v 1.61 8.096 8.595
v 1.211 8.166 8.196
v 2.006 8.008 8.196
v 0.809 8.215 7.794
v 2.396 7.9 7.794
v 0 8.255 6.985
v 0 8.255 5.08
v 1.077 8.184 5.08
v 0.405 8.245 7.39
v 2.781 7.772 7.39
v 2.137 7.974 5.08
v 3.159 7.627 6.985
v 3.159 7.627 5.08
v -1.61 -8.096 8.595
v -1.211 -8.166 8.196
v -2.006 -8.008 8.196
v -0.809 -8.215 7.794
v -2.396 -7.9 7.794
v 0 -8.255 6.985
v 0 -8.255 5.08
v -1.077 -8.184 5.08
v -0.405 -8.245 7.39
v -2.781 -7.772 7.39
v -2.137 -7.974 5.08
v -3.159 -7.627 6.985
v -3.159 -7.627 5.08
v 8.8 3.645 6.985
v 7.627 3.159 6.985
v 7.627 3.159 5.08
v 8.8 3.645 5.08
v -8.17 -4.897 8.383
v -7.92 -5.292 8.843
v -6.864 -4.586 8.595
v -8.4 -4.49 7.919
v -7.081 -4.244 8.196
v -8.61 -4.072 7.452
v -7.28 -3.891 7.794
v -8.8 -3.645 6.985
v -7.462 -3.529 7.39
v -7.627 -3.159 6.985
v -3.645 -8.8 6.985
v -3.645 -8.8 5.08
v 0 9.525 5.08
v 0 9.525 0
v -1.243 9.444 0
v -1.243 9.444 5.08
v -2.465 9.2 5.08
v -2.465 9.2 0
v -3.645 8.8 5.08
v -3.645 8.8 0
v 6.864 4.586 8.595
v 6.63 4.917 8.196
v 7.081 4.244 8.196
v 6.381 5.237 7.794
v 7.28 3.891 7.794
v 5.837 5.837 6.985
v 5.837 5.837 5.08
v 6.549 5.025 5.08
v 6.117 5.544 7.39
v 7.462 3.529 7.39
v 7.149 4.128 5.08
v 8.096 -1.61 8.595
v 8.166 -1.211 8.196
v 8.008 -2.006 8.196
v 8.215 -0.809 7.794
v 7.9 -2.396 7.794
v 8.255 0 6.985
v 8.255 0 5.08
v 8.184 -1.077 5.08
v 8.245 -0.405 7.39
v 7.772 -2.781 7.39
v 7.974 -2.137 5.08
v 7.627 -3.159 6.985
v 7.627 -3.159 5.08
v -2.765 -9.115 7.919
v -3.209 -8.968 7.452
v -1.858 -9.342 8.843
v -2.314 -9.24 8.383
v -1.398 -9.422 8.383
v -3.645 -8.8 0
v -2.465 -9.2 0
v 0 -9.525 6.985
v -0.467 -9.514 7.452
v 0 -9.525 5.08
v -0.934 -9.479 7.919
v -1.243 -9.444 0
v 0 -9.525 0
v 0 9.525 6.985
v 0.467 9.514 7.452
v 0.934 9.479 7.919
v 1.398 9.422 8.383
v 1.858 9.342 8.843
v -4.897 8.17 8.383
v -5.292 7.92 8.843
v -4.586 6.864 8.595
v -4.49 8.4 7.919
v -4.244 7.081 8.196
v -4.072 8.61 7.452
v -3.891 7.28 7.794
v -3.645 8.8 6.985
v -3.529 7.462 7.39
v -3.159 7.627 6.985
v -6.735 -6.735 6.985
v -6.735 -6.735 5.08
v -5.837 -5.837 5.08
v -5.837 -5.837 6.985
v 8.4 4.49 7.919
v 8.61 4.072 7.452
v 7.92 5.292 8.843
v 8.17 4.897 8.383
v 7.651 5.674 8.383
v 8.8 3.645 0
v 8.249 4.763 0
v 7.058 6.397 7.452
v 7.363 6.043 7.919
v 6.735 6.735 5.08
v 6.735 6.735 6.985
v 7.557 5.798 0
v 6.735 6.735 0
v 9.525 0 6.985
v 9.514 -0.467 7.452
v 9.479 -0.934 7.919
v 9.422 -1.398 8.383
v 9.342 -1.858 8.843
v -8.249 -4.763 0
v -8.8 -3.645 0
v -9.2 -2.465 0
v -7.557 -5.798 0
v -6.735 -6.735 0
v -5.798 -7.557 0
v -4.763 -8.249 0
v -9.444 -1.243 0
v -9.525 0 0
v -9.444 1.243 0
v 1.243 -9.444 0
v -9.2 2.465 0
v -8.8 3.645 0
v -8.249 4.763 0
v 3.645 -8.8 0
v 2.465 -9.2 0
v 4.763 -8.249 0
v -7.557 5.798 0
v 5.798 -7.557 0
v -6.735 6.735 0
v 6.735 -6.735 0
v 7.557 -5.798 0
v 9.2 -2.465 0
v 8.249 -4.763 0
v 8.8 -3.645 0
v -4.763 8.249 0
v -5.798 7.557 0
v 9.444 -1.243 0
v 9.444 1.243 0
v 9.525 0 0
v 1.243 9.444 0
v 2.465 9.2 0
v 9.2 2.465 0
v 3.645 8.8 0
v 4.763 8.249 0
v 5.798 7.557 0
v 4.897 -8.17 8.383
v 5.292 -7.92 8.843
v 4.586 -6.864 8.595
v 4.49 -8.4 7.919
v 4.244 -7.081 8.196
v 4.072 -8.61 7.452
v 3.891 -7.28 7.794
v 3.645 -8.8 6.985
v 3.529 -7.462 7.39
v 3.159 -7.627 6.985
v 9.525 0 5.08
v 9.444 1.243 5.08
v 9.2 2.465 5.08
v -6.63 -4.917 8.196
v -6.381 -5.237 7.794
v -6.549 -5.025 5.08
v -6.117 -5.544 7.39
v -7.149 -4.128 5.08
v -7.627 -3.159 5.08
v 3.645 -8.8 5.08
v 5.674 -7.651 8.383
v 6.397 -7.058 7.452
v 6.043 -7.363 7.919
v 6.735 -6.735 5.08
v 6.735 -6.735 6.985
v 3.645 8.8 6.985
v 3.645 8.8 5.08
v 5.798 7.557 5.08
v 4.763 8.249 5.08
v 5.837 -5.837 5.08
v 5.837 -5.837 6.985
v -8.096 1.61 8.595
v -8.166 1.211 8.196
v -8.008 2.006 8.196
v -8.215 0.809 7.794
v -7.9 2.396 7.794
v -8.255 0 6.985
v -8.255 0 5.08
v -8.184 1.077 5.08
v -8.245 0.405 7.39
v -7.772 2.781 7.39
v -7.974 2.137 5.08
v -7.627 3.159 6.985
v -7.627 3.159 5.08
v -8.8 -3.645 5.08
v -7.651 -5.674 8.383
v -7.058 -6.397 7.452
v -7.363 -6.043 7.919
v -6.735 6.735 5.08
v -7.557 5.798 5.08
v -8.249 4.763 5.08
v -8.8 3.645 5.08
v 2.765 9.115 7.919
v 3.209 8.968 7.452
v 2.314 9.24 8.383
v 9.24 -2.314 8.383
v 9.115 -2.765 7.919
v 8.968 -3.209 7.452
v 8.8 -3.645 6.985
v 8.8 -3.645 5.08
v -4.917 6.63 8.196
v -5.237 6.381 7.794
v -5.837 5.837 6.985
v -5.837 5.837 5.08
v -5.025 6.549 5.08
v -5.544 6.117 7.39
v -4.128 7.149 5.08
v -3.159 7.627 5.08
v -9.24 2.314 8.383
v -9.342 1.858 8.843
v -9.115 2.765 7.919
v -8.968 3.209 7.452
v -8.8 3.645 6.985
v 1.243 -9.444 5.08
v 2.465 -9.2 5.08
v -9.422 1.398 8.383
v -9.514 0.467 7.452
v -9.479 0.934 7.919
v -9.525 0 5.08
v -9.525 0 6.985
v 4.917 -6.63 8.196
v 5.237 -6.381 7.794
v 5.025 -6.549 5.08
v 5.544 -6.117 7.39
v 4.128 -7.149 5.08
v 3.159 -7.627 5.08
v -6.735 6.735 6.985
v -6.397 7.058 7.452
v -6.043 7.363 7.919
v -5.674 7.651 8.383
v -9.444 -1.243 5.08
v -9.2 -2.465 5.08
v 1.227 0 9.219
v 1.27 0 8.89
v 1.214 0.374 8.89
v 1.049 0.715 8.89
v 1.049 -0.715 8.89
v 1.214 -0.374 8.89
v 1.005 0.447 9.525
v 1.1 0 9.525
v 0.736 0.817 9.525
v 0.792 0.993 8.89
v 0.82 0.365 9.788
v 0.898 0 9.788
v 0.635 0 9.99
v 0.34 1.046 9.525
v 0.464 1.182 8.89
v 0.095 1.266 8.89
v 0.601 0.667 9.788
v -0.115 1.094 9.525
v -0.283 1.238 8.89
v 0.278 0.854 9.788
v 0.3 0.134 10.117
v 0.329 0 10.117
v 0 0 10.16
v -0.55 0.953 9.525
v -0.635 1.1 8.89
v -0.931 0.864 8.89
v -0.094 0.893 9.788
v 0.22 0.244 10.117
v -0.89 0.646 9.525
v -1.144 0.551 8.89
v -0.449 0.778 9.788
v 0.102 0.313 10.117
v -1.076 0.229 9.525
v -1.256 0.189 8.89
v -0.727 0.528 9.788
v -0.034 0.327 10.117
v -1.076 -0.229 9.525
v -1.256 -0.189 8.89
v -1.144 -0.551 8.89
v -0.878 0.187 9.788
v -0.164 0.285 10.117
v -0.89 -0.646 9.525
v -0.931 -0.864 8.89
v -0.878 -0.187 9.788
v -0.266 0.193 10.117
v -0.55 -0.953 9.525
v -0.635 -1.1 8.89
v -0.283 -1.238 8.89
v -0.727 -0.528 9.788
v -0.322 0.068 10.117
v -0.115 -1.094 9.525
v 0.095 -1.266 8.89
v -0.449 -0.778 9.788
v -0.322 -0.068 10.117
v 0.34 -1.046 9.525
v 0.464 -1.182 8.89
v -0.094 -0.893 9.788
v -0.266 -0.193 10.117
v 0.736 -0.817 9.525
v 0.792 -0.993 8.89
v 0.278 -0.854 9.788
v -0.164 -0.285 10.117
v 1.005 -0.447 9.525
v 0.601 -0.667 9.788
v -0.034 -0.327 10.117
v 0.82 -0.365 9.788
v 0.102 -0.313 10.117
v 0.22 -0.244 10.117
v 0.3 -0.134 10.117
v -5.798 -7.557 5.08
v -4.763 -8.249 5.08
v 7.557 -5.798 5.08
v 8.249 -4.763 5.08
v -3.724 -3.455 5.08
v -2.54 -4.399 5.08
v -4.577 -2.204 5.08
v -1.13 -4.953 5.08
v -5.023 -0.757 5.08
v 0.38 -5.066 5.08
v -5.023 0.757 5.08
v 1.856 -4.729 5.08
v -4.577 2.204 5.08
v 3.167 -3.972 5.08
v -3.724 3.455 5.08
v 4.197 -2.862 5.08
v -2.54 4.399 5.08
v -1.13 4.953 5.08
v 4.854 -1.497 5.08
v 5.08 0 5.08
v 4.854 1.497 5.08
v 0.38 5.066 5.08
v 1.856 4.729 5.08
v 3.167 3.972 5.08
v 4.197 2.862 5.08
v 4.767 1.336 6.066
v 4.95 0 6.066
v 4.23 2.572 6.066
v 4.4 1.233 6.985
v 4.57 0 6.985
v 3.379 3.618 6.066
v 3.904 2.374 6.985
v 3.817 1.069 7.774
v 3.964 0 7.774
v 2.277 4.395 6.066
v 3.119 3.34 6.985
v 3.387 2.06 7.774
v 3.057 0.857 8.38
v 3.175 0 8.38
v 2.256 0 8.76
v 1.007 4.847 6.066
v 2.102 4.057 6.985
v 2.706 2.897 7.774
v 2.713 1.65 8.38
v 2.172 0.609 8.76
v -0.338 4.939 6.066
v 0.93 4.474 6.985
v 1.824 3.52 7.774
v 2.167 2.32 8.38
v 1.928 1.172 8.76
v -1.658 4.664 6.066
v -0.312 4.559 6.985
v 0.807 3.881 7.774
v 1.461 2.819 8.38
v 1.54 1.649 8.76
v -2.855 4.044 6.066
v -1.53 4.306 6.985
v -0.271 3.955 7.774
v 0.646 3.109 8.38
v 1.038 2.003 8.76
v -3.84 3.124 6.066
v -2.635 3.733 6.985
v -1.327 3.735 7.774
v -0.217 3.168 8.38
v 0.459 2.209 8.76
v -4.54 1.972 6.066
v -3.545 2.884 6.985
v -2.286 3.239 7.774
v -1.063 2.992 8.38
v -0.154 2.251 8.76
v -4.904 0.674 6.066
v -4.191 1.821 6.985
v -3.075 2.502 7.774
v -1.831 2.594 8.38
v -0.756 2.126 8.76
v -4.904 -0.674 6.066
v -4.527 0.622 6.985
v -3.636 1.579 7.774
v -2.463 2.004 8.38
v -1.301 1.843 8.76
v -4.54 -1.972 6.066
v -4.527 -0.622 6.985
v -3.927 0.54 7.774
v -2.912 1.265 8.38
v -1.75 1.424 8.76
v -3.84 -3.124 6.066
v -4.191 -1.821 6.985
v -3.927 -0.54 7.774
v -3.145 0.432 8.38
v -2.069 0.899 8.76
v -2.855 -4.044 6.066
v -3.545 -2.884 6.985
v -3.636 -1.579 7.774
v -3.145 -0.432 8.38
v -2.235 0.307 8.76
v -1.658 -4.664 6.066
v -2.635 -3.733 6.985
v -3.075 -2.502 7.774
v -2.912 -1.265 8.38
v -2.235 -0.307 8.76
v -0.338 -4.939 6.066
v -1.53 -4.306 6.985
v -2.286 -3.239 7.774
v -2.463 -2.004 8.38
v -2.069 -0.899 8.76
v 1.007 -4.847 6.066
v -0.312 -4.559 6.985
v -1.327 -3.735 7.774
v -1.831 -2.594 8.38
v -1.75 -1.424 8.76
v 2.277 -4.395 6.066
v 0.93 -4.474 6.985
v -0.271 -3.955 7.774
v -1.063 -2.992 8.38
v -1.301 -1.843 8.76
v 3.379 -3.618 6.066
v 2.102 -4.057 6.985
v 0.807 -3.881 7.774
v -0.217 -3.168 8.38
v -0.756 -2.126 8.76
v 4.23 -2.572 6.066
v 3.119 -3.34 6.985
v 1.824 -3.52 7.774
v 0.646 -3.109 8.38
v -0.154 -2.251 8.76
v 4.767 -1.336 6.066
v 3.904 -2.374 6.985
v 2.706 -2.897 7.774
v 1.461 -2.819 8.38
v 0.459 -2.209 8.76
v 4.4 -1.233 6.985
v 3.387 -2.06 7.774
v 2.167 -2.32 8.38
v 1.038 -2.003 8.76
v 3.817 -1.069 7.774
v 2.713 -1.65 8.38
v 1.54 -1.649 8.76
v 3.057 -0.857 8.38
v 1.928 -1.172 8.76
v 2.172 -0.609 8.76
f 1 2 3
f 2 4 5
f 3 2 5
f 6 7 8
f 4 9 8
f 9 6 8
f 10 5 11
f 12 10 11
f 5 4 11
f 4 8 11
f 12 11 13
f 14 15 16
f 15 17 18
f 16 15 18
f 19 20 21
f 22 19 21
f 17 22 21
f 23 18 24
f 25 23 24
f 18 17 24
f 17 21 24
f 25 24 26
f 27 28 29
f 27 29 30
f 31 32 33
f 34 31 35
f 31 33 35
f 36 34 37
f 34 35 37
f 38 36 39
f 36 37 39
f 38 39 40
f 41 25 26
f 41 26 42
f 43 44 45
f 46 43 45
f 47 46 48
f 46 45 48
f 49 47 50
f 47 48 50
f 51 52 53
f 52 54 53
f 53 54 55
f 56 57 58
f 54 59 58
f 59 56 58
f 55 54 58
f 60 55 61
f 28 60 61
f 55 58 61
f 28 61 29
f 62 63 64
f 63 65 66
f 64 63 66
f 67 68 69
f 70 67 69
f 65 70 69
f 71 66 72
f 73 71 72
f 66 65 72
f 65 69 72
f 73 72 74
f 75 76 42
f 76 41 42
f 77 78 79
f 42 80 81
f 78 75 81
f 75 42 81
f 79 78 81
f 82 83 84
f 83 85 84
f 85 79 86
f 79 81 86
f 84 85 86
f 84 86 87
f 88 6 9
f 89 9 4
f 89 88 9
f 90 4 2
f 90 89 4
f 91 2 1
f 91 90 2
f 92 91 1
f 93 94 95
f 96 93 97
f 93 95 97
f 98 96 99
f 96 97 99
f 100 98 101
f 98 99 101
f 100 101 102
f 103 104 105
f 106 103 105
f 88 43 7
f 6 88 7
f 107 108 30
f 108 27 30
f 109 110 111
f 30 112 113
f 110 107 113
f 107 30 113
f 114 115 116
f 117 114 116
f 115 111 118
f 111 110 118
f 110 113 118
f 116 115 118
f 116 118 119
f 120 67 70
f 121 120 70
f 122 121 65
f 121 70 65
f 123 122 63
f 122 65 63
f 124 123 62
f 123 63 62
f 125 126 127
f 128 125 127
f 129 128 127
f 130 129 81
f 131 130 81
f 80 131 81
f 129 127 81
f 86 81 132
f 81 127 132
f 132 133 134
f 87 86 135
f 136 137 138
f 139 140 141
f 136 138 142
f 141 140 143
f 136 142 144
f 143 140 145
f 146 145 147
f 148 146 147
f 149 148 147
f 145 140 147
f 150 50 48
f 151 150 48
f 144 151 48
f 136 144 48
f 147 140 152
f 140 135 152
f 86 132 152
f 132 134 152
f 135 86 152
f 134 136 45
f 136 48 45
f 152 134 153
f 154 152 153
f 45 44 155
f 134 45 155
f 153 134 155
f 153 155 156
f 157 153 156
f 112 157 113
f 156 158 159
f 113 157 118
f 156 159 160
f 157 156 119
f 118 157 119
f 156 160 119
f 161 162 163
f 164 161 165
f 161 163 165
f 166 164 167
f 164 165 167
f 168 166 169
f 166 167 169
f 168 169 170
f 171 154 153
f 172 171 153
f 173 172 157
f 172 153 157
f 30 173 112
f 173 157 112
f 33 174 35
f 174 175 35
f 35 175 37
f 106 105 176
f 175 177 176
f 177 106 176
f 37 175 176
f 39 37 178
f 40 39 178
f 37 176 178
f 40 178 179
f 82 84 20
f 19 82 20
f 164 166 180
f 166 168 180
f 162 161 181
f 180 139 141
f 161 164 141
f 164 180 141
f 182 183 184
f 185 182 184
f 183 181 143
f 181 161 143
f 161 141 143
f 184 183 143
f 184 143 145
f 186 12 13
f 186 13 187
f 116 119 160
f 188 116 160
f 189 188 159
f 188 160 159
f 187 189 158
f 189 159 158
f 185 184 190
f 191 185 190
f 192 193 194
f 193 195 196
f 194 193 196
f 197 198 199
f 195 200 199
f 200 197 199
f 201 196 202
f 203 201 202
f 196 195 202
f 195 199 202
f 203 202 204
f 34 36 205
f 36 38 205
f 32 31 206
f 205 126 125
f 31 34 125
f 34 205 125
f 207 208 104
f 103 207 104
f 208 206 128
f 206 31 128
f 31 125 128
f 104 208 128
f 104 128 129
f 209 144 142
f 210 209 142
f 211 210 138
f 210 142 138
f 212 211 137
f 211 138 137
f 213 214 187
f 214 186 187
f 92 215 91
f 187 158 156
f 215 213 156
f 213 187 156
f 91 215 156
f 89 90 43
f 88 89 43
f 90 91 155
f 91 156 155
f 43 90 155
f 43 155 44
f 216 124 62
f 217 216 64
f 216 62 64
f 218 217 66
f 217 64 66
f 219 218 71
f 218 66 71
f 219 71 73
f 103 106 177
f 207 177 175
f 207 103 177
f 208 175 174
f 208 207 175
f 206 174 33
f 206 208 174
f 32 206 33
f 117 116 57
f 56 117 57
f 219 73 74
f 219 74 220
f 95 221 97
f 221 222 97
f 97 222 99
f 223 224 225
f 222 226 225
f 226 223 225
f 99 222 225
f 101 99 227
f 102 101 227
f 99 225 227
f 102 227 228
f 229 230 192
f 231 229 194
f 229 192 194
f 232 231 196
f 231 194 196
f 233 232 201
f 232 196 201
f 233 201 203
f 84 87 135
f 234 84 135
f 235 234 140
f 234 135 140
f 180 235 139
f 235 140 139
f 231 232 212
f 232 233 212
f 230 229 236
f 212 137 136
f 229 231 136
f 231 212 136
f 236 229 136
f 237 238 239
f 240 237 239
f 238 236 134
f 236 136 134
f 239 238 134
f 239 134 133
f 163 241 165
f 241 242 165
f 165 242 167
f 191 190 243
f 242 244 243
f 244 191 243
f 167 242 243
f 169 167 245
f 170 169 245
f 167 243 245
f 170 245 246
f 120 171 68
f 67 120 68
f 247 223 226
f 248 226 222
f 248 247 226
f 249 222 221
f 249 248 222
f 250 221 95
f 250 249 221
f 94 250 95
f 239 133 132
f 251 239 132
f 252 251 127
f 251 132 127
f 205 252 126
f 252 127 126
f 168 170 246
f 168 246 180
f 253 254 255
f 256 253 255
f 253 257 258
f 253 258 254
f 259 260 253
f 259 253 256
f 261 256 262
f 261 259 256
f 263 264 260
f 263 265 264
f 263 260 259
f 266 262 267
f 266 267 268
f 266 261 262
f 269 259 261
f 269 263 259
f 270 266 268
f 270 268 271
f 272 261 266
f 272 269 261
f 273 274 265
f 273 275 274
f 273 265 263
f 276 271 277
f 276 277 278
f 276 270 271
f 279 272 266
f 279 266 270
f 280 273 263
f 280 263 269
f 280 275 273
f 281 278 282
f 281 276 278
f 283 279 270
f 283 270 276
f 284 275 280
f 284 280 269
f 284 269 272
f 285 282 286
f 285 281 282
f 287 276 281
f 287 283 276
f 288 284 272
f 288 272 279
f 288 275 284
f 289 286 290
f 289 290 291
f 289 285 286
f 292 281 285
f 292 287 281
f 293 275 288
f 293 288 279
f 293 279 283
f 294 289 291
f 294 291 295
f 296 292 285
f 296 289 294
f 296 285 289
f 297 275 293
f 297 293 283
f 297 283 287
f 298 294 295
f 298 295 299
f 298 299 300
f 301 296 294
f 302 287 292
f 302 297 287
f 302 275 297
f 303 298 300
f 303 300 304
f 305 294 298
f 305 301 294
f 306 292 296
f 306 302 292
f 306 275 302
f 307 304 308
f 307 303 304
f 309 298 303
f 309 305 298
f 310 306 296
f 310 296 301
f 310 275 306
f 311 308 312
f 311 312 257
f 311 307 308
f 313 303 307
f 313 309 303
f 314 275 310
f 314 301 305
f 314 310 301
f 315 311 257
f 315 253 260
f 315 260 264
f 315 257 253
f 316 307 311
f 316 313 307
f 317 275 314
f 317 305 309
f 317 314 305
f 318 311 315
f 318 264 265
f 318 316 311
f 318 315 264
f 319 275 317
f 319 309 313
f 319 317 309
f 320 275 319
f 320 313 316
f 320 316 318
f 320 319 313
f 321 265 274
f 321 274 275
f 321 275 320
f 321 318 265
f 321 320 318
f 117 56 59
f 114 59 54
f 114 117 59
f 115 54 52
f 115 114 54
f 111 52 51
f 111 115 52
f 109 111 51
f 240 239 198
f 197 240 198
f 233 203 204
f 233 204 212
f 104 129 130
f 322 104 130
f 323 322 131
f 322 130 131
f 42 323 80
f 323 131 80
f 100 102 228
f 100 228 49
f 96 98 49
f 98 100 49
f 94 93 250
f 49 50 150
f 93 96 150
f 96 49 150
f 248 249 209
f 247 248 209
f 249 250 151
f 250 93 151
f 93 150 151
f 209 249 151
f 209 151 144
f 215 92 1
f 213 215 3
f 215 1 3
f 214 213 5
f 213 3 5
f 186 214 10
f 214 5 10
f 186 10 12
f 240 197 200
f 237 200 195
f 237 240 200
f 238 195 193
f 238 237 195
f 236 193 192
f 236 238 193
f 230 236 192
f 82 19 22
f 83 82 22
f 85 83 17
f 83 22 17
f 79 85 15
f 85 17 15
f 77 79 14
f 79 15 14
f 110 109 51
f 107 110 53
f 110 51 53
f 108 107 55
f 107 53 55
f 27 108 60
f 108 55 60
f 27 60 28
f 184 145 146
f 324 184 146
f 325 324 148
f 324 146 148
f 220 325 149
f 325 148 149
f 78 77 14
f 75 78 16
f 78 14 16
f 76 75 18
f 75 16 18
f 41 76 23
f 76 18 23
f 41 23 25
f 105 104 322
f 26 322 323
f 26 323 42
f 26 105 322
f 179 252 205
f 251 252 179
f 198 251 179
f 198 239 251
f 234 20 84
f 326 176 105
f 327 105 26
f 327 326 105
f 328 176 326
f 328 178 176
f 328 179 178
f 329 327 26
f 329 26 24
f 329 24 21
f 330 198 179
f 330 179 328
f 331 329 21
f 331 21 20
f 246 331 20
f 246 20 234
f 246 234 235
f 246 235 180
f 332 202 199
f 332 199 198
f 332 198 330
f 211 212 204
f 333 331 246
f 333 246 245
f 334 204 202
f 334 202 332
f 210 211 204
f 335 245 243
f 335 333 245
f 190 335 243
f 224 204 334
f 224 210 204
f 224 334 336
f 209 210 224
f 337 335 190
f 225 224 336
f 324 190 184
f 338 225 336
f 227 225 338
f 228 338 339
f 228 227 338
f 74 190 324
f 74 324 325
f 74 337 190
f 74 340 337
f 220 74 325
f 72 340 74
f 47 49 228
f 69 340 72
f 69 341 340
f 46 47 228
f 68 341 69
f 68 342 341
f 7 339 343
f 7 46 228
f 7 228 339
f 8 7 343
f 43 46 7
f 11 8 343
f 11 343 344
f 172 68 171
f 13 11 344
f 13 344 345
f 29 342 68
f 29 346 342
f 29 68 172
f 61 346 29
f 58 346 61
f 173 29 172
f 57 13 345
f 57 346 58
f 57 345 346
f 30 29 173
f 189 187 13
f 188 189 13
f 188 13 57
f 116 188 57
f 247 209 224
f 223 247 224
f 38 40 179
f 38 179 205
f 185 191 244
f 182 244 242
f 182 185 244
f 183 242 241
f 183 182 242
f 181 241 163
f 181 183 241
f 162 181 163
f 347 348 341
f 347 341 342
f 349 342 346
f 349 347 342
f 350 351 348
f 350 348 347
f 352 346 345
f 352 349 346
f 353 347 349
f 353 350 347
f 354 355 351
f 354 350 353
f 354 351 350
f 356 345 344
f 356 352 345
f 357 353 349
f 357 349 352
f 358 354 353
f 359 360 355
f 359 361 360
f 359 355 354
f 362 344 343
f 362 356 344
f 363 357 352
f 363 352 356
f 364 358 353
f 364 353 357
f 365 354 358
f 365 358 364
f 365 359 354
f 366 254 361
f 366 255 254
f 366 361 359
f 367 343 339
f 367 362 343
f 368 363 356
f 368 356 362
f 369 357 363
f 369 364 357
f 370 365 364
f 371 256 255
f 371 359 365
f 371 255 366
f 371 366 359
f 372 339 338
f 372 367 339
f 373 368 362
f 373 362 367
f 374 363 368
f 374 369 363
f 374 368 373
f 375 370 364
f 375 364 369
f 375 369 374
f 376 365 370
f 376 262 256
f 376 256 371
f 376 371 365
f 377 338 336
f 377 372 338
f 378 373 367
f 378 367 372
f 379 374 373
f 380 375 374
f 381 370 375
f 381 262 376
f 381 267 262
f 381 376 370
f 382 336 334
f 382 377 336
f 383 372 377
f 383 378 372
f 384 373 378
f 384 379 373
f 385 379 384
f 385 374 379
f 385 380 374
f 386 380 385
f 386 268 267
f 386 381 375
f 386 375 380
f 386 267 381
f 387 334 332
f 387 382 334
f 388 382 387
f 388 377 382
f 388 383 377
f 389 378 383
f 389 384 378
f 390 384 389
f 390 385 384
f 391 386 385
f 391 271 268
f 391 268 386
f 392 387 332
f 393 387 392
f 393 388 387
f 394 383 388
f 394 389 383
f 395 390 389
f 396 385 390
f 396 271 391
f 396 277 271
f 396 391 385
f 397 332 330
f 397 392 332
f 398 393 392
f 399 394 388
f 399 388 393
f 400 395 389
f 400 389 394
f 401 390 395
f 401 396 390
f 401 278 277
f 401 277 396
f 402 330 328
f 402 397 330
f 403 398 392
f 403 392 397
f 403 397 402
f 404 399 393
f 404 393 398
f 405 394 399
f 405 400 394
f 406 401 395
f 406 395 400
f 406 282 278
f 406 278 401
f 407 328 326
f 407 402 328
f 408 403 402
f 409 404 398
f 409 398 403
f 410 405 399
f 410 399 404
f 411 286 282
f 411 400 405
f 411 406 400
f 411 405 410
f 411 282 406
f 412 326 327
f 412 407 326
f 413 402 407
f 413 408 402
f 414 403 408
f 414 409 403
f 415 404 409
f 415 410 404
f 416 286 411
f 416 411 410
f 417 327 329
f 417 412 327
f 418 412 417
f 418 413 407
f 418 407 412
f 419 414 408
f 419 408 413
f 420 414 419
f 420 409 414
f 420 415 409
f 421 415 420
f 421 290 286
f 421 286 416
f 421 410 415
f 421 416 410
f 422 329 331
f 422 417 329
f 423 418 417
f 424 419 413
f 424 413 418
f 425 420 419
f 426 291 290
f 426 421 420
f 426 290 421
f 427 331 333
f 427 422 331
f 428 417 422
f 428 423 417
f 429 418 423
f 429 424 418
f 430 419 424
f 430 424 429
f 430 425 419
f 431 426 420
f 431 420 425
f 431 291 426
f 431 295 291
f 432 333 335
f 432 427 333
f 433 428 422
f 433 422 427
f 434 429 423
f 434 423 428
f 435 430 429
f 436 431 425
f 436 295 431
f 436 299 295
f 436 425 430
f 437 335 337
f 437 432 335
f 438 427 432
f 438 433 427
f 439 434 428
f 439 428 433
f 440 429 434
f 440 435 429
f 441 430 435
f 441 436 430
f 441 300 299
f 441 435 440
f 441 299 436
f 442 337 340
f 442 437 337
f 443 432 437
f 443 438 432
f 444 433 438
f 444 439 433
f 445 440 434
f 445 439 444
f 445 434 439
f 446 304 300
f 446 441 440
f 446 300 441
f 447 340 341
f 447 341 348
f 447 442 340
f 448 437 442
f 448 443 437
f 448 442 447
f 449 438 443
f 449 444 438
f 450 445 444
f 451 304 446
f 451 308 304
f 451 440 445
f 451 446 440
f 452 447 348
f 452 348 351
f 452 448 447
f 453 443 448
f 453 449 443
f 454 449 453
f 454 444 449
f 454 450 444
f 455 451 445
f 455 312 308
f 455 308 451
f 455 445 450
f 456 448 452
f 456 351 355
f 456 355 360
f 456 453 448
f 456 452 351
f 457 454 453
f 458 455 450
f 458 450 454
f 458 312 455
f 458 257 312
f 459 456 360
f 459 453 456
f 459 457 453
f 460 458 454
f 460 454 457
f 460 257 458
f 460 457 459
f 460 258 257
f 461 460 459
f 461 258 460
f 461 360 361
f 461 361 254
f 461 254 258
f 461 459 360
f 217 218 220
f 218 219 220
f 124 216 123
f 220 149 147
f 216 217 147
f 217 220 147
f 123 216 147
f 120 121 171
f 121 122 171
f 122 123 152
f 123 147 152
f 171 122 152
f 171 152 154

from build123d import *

# Parameters (mm, degrees)
F1_DEPTH     = 5.08
F2_DEPTH     = 8.89
F3_T1_DEPTH  = 11.0681121842
F3_T3_DEPTH  = 11.0681121842
F3_T5_DEPTH  = 11.0681121842
F3_T7_DEPTH  = 11.0681121842
F3_T9_DEPTH  = 11.0681121842
F3_T11_DEPTH = 11.0681121842
F3_T13_DEPTH = 11.0681121842
F3_T15_DEPTH = 11.0681121842
F3_T17_DEPTH = 11.0681121842
F3_T19_DEPTH = 11.0681121842
F3_T21_DEPTH = 11.0681121842
F3_T23_DEPTH = 11.0681121842
F3_T25_DEPTH = 11.0681121842
F3_T27_DEPTH = 11.0681121842
F3_T29_DEPTH = 11.0681121842
F3_T31_DEPTH = 11.0681121842
F4_R         = 5.08
F5_DEPTH     = 3.81
F6_R         = 3.80999
F7_R         = 1.27
F8_DEPTH     = 1.27
F9_R         = 1.26999


# Not quite as in the source:
# - a fillet or chamfer that OpenCascade refuses, or shapes differently, is made with other operations: its cross-section is extruded or revolved along the edge and cut away or added
# - a fillet or chamfer is up to 0.001 mm smaller than in the source, because OpenCascade refuses the exact size
# - a feature names something its author has since deleted; it is built from what else it names


with BuildPart() as f1:
    # F0 (on Top) → F1 (new body)
    with BuildSketch(Plane.XY):
        with BuildLine():
            Line((8.255, 0), (9.525, 0))
            ThreePointArc((9.525, 0), (9.3419797958, 1.8582353172), (8.7999525472, 3.6450596933))
            Line((8.7999525472, 3.6450596933), (7.6266255409, 3.1590517342))
            ThreePointArc((7.6266255409, 3.1590517342), (6.8637816496, 4.5862322736), (5.8371664787, 5.8371664787))
            Line((5.8371664787, 5.8371664787), (6.7351920908, 6.7351920908))
            ThreePointArc((6.7351920908, 6.7351920908), (5.2918064695, 7.9197480572), (3.6450596933, 8.7999525472))
            Line((3.6450596933, 8.7999525472), (3.1590517342, 7.6266255409))
            ThreePointArc((3.1590517342, 7.6266255409), (1.6104706082, 8.0963824897), (0, 8.255))
            Line((0, 8.255), (0, 9.525))
            ThreePointArc((0, 9.525), (-1.8582353172, 9.3419797958), (-3.6450596933, 8.7999525472))
            Line((-3.6450596933, 8.7999525472), (-3.1590517342, 7.6266255409))
            ThreePointArc((-3.1590517342, 7.6266255409), (-4.5862322736, 6.8637816496), (-5.8371664787, 5.8371664787))
            Line((-5.8371664787, 5.8371664787), (-6.7351920908, 6.7351920908))
            ThreePointArc((-6.7351920908, 6.7351920908), (-7.9197480572, 5.2918064695), (-8.7999525472, 3.6450596933))
            Line((-8.7999525472, 3.6450596933), (-7.6266255409, 3.1590517342))
            ThreePointArc((-7.6266255409, 3.1590517342), (-8.0963824897, 1.6104706082), (-8.255, 0))
            Line((-8.255, 0), (-9.525, 0))
            ThreePointArc((-9.525, 0), (-9.3419797958, -1.8582353172), (-8.7999525472, -3.6450596933))
            Line((-8.7999525472, -3.6450596933), (-7.6266255409, -3.1590517342))
            ThreePointArc((-7.6266255409, -3.1590517342), (-6.8637816496, -4.5862322736), (-5.8371664787, -5.8371664787))
            Line((-5.8371664787, -5.8371664787), (-6.7351920908, -6.7351920908))
            ThreePointArc((-6.7351920908, -6.7351920908), (-5.2918064695, -7.9197480572), (-3.6450596933, -8.7999525472))
            Line((-3.6450596933, -8.7999525472), (-3.1590517342, -7.6266255409))
            ThreePointArc((-3.1590517342, -7.6266255409), (-1.6104706082, -8.0963824897), (0, -8.255))
            Line((0, -8.255), (0, -9.525))
            ThreePointArc((0, -9.525), (1.8582353172, -9.3419797958), (3.6450596933, -8.7999525472))
            Line((3.6450596933, -8.7999525472), (3.1590517342, -7.6266255409))
            ThreePointArc((3.1590517342, -7.6266255409), (4.5862322736, -6.8637816496), (5.8371664787, -5.8371664787))
            Line((5.8371664787, -5.8371664787), (6.7351920908, -6.7351920908))
            ThreePointArc((6.7351920908, -6.7351920908), (7.9197480572, -5.2918064695), (8.7999525472, -3.6450596933))
            Line((8.7999525472, -3.6450596933), (7.6266255409, -3.1590517342))
            ThreePointArc((7.6266255409, -3.1590517342), (8.0963824897, -1.6104706082), (8.255, 0))
        make_face()
        with BuildLine():
            ThreePointArc((-8.7999525472, -3.6450596933), (-7.9197480572, -5.2918064695), (-6.7351920908, -6.7351920908))
            Line((-6.7351920908, -6.7351920908), (-5.8371664787, -5.8371664787))
            ThreePointArc((-5.8371664787, -5.8371664787), (-6.8637816496, -4.5862322736), (-7.6266255409, -3.1590517342))
            Line((-7.6266255409, -3.1590517342), (-8.7999525472, -3.6450596933))
        make_face()
    extrude(amount=F1_DEPTH)

    # F0 (on Top) → F2 (join)
    with BuildSketch(Plane.XY):
        with BuildLine():
            Line((3.1590517342, 7.6266255409), (3.6450596933, 8.7999525472))
            ThreePointArc((3.6450596933, 8.7999525472), (1.8582353172, 9.3419797958), (0, 9.525))
            Line((0, 9.525), (0, 8.255))
            ThreePointArc((0, 8.255), (1.6104706082, 8.0963824897), (3.1590517342, 7.6266255409))
        make_face()
        with BuildLine():
            Line((7.6266255409, 3.1590517342), (8.7999525472, 3.6450596933))
            ThreePointArc((8.7999525472, 3.6450596933), (7.9197480572, 5.2918064695), (6.7351920908, 6.7351920908))
            Line((6.7351920908, 6.7351920908), (5.8371664787, 5.8371664787))
            ThreePointArc((5.8371664787, 5.8371664787), (6.8637816496, 4.5862322736), (7.6266255409, 3.1590517342))
        make_face()
        with BuildLine():
            ThreePointArc((3.6450596933, -8.7999525472), (5.2918064695, -7.9197480572), (6.7351920908, -6.7351920908))
            Line((6.7351920908, -6.7351920908), (5.8371664787, -5.8371664787))
            ThreePointArc((5.8371664787, -5.8371664787), (4.5862322736, -6.8637816496), (3.1590517342, -7.6266255409))
            Line((3.1590517342, -7.6266255409), (3.6450596933, -8.7999525472))
        make_face()
        with BuildLine():
            ThreePointArc((8.7999525472, -3.6450596933), (9.3419797958, -1.8582353172), (9.525, 0))
            Line((9.525, 0), (8.255, 0))
            ThreePointArc((8.255, 0), (8.0963824897, -1.6104706082), (7.6266255409, -3.1590517342))
            Line((7.6266255409, -3.1590517342), (8.7999525472, -3.6450596933))
        make_face()
        with BuildLine():
            ThreePointArc((-3.6450596933, -8.7999525472), (-1.8582353172, -9.3419797958), (0, -9.525))
            Line((0, -9.525), (0, -8.255))
            ThreePointArc((0, -8.255), (-1.6104706082, -8.0963824897), (-3.1590517342, -7.6266255409))
            Line((-3.1590517342, -7.6266255409), (-3.6450596933, -8.7999525472))
        make_face()
        with BuildLine():
            ThreePointArc((-8.7999525472, -3.6450596933), (-7.9197480572, -5.2918064695), (-6.7351920908, -6.7351920908))
            Line((-6.7351920908, -6.7351920908), (-5.8371664787, -5.8371664787))
            ThreePointArc((-5.8371664787, -5.8371664787), (-6.8637816496, -4.5862322736), (-7.6266255409, -3.1590517342))
            Line((-7.6266255409, -3.1590517342), (-8.7999525472, -3.6450596933))
        make_face()
        with BuildLine():
            Line((-7.6266255409, 3.1590517342), (-8.7999525472, 3.6450596933))
            ThreePointArc((-8.7999525472, 3.6450596933), (-9.3419797958, 1.8582353172), (-9.525, 0))
            Line((-9.525, 0), (-8.255, 0))
            ThreePointArc((-8.255, 0), (-8.0963824897, 1.6104706082), (-7.6266255409, 3.1590517342))
        make_face()
        with BuildLine():
            Line((-3.1590517342, 7.6266255409), (-3.6450596933, 8.7999525472))
            ThreePointArc((-3.6450596933, 8.7999525472), (-5.2918064695, 7.9197480572), (-6.7351920908, 6.7351920908))
            Line((-6.7351920908, 6.7351920908), (-5.8371664787, 5.8371664787))
            ThreePointArc((-5.8371664787, 5.8371664787), (-4.5862322736, 6.8637816496), (-3.1590517342, 7.6266255409))
        make_face()
    extrude(amount=F2_DEPTH)

    # F3: chamfer of 1.905 on 16 edges, made by hand

    # F3_s2 → F3_t1 (cut)
    with BuildSketch(Plane(origin=(1.2842641335, 3.1004878888, 0), x_dir=(0, 0, 1), z_dir=(0.3826834324, 0.9238795325, 0))):
        Polygon((8.89, -1.905), (6.985, 0), (8.89, 0), align=None)
    extrude(amount=F3_T1_DEPTH, mode=Mode.SUBTRACT)

    # F3_s4 → F3_t3 (cut)
    with BuildSketch(Plane.XZ.offset(-14.4240560921)):
        Polygon((0, 6.985), (1.905, 8.89), (0, 8.89), align=None)
    extrude(amount=F3_T3_DEPTH, mode=Mode.SUBTRACT)

    # F3_s6 → F3_t5 (cut)
    with BuildSketch(Plane(origin=(3.1004878888, 1.2842641335, 0), x_dir=(0, 0, 1), z_dir=(0.9238795325, 0.3826834324, 0))):
        Polygon((8.89, -1.905), (6.985, 0), (8.89, 0), align=None)
    extrude(amount=F3_T5_DEPTH, mode=Mode.SUBTRACT)

    # F3_s8 → F3_t7 (cut)
    with BuildSketch(Plane(origin=(10.1993478749, 10.1993478749, 0), x_dir=(0, 0, 1), z_dir=(-0.7071067812, -0.7071067812, 0))):
        Polygon((6.985, 0), (8.89, -1.905), (8.89, 0), align=None)
    extrude(amount=F3_T7_DEPTH, mode=Mode.SUBTRACT)

    # F3_s10 → F3_t9 (cut)
    with BuildSketch(Plane(origin=(1.2842641335, -3.1004878888, 0), x_dir=(0, 0, 1), z_dir=(0.3826834324, -0.9238795325, 0))):
        Polygon((8.89, -1.905), (6.985, 0), (8.89, 0), align=None)
    extrude(amount=F3_T9_DEPTH, mode=Mode.SUBTRACT)

    # F3_s12 → F3_t11 (cut)
    with BuildSketch(Plane(origin=(10.1993478749, -10.1993478749, 0), x_dir=(0, 0, 1), z_dir=(-0.7071067812, 0.7071067812, 0))):
        Polygon((6.985, 0), (8.89, -1.905), (8.89, 0), align=None)
    extrude(amount=F3_T11_DEPTH, mode=Mode.SUBTRACT)

    # F3_s14 → F3_t13 (cut)
    with BuildSketch(Plane(origin=(3.1004878888, -1.2842641335, 0), x_dir=(0, 0, 1), z_dir=(0.9238795325, -0.3826834324, 0))):
        Polygon((8.89, -1.905), (6.985, 0), (8.89, 0), align=None)
    extrude(amount=F3_T13_DEPTH, mode=Mode.SUBTRACT)

    # F3_s16 → F3_t15 (cut)
    with BuildSketch(Plane.YZ.offset(3.3559439079)):
        Polygon((0, 6.985), (-1.905, 8.89), (0, 8.89), align=None)
    extrude(amount=F3_T15_DEPTH, mode=Mode.SUBTRACT)

    # F3_s18 → F3_t17 (cut)
    with BuildSketch(Plane.XZ.offset(3.3559439079)):
        Polygon((0, 6.985), (-1.905, 8.89), (0, 8.89), align=None)
    extrude(amount=F3_T17_DEPTH, mode=Mode.SUBTRACT)

    # F3_s20 → F3_t19 (cut)
    with BuildSketch(Plane(origin=(-1.2842641335, -3.1004878888, 0), x_dir=(0, 0, 1), z_dir=(-0.3826834324, -0.9238795325, 0))):
        Polygon((8.89, -1.905), (6.985, 0), (8.89, 0), align=None)
    extrude(amount=F3_T19_DEPTH, mode=Mode.SUBTRACT)

    # F3_s22 → F3_t21 (cut)
    with BuildSketch(Plane(origin=(-10.1993478749, -10.1993478749, 0), x_dir=(0, 0, 1), z_dir=(0.7071067812, 0.7071067812, 0))):
        Polygon((6.985, 0), (8.89, -1.905), (8.89, 0), align=None)
    extrude(amount=F3_T21_DEPTH, mode=Mode.SUBTRACT)

    # F3_s24 → F3_t23 (cut)
    with BuildSketch(Plane(origin=(-3.1004878888, -1.2842641335, 0), x_dir=(0, 0, 1), z_dir=(-0.9238795325, -0.3826834324, 0))):
        Polygon((8.89, -1.905), (6.985, 0), (8.89, 0), align=None)
    extrude(amount=F3_T23_DEPTH, mode=Mode.SUBTRACT)

    # F3_s26 → F3_t25 (cut)
    with BuildSketch(Plane.YZ.offset(-14.4240560921)):
        Polygon((0, 6.985), (1.905, 8.89), (0, 8.89), align=None)
    extrude(amount=F3_T25_DEPTH, mode=Mode.SUBTRACT)

    # F3_s28 → F3_t27 (cut)
    with BuildSketch(Plane(origin=(-3.1004878888, 1.2842641335, 0), x_dir=(0, 0, 1), z_dir=(-0.9238795325, 0.3826834324, 0))):
        Polygon((8.89, -1.905), (6.985, 0), (8.89, 0), align=None)
    extrude(amount=F3_T27_DEPTH, mode=Mode.SUBTRACT)

    # F3_s30 → F3_t29 (cut)
    with BuildSketch(Plane(origin=(-10.1993478749, 10.1993478749, 0), x_dir=(0, 0, 1), z_dir=(0.7071067812, -0.7071067812, 0))):
        Polygon((6.985, 0), (8.89, -1.905), (8.89, 0), align=None)
    extrude(amount=F3_T29_DEPTH, mode=Mode.SUBTRACT)

    # F3_s32 → F3_t31 (cut)
    with BuildSketch(Plane(origin=(-1.2842641335, 3.1004878888, 0), x_dir=(0, 0, 1), z_dir=(-0.3826834324, 0.9238795325, 0))):
        Polygon((8.89, -1.905), (6.985, 0), (8.89, 0), align=None)
    extrude(amount=F3_T31_DEPTH, mode=Mode.SUBTRACT)

    # F4 (on face) → F5 (join)
    with BuildSketch(Plane.XY.offset(5.08)):
        Circle(F4_R)
    extrude(amount=F5_DEPTH)

    # F6 (radius 3.81 in the source; OpenCascade refuses exactly that, so slightly less here)
    f6_edges = [f1.edges().sort_by_distance(p)[0] for p in [
        (-5.08, 0, 8.89),
    ]]
    fillet(f6_edges, radius=F6_R)

    # F7 (on face) → F8 (join)
    with BuildSketch(Plane.XY.offset(8.89)):
        Circle(F7_R)
    extrude(amount=F8_DEPTH)

    # F9 (radius 1.27 in the source; OpenCascade refuses exactly that, so slightly less here)
    f9_edges = [f1.edges().sort_by_distance(p)[0] for p in [
        (-1.27, 0, 10.16),
    ]]
    fillet(f9_edges, radius=F9_R)


solid = f1.part
